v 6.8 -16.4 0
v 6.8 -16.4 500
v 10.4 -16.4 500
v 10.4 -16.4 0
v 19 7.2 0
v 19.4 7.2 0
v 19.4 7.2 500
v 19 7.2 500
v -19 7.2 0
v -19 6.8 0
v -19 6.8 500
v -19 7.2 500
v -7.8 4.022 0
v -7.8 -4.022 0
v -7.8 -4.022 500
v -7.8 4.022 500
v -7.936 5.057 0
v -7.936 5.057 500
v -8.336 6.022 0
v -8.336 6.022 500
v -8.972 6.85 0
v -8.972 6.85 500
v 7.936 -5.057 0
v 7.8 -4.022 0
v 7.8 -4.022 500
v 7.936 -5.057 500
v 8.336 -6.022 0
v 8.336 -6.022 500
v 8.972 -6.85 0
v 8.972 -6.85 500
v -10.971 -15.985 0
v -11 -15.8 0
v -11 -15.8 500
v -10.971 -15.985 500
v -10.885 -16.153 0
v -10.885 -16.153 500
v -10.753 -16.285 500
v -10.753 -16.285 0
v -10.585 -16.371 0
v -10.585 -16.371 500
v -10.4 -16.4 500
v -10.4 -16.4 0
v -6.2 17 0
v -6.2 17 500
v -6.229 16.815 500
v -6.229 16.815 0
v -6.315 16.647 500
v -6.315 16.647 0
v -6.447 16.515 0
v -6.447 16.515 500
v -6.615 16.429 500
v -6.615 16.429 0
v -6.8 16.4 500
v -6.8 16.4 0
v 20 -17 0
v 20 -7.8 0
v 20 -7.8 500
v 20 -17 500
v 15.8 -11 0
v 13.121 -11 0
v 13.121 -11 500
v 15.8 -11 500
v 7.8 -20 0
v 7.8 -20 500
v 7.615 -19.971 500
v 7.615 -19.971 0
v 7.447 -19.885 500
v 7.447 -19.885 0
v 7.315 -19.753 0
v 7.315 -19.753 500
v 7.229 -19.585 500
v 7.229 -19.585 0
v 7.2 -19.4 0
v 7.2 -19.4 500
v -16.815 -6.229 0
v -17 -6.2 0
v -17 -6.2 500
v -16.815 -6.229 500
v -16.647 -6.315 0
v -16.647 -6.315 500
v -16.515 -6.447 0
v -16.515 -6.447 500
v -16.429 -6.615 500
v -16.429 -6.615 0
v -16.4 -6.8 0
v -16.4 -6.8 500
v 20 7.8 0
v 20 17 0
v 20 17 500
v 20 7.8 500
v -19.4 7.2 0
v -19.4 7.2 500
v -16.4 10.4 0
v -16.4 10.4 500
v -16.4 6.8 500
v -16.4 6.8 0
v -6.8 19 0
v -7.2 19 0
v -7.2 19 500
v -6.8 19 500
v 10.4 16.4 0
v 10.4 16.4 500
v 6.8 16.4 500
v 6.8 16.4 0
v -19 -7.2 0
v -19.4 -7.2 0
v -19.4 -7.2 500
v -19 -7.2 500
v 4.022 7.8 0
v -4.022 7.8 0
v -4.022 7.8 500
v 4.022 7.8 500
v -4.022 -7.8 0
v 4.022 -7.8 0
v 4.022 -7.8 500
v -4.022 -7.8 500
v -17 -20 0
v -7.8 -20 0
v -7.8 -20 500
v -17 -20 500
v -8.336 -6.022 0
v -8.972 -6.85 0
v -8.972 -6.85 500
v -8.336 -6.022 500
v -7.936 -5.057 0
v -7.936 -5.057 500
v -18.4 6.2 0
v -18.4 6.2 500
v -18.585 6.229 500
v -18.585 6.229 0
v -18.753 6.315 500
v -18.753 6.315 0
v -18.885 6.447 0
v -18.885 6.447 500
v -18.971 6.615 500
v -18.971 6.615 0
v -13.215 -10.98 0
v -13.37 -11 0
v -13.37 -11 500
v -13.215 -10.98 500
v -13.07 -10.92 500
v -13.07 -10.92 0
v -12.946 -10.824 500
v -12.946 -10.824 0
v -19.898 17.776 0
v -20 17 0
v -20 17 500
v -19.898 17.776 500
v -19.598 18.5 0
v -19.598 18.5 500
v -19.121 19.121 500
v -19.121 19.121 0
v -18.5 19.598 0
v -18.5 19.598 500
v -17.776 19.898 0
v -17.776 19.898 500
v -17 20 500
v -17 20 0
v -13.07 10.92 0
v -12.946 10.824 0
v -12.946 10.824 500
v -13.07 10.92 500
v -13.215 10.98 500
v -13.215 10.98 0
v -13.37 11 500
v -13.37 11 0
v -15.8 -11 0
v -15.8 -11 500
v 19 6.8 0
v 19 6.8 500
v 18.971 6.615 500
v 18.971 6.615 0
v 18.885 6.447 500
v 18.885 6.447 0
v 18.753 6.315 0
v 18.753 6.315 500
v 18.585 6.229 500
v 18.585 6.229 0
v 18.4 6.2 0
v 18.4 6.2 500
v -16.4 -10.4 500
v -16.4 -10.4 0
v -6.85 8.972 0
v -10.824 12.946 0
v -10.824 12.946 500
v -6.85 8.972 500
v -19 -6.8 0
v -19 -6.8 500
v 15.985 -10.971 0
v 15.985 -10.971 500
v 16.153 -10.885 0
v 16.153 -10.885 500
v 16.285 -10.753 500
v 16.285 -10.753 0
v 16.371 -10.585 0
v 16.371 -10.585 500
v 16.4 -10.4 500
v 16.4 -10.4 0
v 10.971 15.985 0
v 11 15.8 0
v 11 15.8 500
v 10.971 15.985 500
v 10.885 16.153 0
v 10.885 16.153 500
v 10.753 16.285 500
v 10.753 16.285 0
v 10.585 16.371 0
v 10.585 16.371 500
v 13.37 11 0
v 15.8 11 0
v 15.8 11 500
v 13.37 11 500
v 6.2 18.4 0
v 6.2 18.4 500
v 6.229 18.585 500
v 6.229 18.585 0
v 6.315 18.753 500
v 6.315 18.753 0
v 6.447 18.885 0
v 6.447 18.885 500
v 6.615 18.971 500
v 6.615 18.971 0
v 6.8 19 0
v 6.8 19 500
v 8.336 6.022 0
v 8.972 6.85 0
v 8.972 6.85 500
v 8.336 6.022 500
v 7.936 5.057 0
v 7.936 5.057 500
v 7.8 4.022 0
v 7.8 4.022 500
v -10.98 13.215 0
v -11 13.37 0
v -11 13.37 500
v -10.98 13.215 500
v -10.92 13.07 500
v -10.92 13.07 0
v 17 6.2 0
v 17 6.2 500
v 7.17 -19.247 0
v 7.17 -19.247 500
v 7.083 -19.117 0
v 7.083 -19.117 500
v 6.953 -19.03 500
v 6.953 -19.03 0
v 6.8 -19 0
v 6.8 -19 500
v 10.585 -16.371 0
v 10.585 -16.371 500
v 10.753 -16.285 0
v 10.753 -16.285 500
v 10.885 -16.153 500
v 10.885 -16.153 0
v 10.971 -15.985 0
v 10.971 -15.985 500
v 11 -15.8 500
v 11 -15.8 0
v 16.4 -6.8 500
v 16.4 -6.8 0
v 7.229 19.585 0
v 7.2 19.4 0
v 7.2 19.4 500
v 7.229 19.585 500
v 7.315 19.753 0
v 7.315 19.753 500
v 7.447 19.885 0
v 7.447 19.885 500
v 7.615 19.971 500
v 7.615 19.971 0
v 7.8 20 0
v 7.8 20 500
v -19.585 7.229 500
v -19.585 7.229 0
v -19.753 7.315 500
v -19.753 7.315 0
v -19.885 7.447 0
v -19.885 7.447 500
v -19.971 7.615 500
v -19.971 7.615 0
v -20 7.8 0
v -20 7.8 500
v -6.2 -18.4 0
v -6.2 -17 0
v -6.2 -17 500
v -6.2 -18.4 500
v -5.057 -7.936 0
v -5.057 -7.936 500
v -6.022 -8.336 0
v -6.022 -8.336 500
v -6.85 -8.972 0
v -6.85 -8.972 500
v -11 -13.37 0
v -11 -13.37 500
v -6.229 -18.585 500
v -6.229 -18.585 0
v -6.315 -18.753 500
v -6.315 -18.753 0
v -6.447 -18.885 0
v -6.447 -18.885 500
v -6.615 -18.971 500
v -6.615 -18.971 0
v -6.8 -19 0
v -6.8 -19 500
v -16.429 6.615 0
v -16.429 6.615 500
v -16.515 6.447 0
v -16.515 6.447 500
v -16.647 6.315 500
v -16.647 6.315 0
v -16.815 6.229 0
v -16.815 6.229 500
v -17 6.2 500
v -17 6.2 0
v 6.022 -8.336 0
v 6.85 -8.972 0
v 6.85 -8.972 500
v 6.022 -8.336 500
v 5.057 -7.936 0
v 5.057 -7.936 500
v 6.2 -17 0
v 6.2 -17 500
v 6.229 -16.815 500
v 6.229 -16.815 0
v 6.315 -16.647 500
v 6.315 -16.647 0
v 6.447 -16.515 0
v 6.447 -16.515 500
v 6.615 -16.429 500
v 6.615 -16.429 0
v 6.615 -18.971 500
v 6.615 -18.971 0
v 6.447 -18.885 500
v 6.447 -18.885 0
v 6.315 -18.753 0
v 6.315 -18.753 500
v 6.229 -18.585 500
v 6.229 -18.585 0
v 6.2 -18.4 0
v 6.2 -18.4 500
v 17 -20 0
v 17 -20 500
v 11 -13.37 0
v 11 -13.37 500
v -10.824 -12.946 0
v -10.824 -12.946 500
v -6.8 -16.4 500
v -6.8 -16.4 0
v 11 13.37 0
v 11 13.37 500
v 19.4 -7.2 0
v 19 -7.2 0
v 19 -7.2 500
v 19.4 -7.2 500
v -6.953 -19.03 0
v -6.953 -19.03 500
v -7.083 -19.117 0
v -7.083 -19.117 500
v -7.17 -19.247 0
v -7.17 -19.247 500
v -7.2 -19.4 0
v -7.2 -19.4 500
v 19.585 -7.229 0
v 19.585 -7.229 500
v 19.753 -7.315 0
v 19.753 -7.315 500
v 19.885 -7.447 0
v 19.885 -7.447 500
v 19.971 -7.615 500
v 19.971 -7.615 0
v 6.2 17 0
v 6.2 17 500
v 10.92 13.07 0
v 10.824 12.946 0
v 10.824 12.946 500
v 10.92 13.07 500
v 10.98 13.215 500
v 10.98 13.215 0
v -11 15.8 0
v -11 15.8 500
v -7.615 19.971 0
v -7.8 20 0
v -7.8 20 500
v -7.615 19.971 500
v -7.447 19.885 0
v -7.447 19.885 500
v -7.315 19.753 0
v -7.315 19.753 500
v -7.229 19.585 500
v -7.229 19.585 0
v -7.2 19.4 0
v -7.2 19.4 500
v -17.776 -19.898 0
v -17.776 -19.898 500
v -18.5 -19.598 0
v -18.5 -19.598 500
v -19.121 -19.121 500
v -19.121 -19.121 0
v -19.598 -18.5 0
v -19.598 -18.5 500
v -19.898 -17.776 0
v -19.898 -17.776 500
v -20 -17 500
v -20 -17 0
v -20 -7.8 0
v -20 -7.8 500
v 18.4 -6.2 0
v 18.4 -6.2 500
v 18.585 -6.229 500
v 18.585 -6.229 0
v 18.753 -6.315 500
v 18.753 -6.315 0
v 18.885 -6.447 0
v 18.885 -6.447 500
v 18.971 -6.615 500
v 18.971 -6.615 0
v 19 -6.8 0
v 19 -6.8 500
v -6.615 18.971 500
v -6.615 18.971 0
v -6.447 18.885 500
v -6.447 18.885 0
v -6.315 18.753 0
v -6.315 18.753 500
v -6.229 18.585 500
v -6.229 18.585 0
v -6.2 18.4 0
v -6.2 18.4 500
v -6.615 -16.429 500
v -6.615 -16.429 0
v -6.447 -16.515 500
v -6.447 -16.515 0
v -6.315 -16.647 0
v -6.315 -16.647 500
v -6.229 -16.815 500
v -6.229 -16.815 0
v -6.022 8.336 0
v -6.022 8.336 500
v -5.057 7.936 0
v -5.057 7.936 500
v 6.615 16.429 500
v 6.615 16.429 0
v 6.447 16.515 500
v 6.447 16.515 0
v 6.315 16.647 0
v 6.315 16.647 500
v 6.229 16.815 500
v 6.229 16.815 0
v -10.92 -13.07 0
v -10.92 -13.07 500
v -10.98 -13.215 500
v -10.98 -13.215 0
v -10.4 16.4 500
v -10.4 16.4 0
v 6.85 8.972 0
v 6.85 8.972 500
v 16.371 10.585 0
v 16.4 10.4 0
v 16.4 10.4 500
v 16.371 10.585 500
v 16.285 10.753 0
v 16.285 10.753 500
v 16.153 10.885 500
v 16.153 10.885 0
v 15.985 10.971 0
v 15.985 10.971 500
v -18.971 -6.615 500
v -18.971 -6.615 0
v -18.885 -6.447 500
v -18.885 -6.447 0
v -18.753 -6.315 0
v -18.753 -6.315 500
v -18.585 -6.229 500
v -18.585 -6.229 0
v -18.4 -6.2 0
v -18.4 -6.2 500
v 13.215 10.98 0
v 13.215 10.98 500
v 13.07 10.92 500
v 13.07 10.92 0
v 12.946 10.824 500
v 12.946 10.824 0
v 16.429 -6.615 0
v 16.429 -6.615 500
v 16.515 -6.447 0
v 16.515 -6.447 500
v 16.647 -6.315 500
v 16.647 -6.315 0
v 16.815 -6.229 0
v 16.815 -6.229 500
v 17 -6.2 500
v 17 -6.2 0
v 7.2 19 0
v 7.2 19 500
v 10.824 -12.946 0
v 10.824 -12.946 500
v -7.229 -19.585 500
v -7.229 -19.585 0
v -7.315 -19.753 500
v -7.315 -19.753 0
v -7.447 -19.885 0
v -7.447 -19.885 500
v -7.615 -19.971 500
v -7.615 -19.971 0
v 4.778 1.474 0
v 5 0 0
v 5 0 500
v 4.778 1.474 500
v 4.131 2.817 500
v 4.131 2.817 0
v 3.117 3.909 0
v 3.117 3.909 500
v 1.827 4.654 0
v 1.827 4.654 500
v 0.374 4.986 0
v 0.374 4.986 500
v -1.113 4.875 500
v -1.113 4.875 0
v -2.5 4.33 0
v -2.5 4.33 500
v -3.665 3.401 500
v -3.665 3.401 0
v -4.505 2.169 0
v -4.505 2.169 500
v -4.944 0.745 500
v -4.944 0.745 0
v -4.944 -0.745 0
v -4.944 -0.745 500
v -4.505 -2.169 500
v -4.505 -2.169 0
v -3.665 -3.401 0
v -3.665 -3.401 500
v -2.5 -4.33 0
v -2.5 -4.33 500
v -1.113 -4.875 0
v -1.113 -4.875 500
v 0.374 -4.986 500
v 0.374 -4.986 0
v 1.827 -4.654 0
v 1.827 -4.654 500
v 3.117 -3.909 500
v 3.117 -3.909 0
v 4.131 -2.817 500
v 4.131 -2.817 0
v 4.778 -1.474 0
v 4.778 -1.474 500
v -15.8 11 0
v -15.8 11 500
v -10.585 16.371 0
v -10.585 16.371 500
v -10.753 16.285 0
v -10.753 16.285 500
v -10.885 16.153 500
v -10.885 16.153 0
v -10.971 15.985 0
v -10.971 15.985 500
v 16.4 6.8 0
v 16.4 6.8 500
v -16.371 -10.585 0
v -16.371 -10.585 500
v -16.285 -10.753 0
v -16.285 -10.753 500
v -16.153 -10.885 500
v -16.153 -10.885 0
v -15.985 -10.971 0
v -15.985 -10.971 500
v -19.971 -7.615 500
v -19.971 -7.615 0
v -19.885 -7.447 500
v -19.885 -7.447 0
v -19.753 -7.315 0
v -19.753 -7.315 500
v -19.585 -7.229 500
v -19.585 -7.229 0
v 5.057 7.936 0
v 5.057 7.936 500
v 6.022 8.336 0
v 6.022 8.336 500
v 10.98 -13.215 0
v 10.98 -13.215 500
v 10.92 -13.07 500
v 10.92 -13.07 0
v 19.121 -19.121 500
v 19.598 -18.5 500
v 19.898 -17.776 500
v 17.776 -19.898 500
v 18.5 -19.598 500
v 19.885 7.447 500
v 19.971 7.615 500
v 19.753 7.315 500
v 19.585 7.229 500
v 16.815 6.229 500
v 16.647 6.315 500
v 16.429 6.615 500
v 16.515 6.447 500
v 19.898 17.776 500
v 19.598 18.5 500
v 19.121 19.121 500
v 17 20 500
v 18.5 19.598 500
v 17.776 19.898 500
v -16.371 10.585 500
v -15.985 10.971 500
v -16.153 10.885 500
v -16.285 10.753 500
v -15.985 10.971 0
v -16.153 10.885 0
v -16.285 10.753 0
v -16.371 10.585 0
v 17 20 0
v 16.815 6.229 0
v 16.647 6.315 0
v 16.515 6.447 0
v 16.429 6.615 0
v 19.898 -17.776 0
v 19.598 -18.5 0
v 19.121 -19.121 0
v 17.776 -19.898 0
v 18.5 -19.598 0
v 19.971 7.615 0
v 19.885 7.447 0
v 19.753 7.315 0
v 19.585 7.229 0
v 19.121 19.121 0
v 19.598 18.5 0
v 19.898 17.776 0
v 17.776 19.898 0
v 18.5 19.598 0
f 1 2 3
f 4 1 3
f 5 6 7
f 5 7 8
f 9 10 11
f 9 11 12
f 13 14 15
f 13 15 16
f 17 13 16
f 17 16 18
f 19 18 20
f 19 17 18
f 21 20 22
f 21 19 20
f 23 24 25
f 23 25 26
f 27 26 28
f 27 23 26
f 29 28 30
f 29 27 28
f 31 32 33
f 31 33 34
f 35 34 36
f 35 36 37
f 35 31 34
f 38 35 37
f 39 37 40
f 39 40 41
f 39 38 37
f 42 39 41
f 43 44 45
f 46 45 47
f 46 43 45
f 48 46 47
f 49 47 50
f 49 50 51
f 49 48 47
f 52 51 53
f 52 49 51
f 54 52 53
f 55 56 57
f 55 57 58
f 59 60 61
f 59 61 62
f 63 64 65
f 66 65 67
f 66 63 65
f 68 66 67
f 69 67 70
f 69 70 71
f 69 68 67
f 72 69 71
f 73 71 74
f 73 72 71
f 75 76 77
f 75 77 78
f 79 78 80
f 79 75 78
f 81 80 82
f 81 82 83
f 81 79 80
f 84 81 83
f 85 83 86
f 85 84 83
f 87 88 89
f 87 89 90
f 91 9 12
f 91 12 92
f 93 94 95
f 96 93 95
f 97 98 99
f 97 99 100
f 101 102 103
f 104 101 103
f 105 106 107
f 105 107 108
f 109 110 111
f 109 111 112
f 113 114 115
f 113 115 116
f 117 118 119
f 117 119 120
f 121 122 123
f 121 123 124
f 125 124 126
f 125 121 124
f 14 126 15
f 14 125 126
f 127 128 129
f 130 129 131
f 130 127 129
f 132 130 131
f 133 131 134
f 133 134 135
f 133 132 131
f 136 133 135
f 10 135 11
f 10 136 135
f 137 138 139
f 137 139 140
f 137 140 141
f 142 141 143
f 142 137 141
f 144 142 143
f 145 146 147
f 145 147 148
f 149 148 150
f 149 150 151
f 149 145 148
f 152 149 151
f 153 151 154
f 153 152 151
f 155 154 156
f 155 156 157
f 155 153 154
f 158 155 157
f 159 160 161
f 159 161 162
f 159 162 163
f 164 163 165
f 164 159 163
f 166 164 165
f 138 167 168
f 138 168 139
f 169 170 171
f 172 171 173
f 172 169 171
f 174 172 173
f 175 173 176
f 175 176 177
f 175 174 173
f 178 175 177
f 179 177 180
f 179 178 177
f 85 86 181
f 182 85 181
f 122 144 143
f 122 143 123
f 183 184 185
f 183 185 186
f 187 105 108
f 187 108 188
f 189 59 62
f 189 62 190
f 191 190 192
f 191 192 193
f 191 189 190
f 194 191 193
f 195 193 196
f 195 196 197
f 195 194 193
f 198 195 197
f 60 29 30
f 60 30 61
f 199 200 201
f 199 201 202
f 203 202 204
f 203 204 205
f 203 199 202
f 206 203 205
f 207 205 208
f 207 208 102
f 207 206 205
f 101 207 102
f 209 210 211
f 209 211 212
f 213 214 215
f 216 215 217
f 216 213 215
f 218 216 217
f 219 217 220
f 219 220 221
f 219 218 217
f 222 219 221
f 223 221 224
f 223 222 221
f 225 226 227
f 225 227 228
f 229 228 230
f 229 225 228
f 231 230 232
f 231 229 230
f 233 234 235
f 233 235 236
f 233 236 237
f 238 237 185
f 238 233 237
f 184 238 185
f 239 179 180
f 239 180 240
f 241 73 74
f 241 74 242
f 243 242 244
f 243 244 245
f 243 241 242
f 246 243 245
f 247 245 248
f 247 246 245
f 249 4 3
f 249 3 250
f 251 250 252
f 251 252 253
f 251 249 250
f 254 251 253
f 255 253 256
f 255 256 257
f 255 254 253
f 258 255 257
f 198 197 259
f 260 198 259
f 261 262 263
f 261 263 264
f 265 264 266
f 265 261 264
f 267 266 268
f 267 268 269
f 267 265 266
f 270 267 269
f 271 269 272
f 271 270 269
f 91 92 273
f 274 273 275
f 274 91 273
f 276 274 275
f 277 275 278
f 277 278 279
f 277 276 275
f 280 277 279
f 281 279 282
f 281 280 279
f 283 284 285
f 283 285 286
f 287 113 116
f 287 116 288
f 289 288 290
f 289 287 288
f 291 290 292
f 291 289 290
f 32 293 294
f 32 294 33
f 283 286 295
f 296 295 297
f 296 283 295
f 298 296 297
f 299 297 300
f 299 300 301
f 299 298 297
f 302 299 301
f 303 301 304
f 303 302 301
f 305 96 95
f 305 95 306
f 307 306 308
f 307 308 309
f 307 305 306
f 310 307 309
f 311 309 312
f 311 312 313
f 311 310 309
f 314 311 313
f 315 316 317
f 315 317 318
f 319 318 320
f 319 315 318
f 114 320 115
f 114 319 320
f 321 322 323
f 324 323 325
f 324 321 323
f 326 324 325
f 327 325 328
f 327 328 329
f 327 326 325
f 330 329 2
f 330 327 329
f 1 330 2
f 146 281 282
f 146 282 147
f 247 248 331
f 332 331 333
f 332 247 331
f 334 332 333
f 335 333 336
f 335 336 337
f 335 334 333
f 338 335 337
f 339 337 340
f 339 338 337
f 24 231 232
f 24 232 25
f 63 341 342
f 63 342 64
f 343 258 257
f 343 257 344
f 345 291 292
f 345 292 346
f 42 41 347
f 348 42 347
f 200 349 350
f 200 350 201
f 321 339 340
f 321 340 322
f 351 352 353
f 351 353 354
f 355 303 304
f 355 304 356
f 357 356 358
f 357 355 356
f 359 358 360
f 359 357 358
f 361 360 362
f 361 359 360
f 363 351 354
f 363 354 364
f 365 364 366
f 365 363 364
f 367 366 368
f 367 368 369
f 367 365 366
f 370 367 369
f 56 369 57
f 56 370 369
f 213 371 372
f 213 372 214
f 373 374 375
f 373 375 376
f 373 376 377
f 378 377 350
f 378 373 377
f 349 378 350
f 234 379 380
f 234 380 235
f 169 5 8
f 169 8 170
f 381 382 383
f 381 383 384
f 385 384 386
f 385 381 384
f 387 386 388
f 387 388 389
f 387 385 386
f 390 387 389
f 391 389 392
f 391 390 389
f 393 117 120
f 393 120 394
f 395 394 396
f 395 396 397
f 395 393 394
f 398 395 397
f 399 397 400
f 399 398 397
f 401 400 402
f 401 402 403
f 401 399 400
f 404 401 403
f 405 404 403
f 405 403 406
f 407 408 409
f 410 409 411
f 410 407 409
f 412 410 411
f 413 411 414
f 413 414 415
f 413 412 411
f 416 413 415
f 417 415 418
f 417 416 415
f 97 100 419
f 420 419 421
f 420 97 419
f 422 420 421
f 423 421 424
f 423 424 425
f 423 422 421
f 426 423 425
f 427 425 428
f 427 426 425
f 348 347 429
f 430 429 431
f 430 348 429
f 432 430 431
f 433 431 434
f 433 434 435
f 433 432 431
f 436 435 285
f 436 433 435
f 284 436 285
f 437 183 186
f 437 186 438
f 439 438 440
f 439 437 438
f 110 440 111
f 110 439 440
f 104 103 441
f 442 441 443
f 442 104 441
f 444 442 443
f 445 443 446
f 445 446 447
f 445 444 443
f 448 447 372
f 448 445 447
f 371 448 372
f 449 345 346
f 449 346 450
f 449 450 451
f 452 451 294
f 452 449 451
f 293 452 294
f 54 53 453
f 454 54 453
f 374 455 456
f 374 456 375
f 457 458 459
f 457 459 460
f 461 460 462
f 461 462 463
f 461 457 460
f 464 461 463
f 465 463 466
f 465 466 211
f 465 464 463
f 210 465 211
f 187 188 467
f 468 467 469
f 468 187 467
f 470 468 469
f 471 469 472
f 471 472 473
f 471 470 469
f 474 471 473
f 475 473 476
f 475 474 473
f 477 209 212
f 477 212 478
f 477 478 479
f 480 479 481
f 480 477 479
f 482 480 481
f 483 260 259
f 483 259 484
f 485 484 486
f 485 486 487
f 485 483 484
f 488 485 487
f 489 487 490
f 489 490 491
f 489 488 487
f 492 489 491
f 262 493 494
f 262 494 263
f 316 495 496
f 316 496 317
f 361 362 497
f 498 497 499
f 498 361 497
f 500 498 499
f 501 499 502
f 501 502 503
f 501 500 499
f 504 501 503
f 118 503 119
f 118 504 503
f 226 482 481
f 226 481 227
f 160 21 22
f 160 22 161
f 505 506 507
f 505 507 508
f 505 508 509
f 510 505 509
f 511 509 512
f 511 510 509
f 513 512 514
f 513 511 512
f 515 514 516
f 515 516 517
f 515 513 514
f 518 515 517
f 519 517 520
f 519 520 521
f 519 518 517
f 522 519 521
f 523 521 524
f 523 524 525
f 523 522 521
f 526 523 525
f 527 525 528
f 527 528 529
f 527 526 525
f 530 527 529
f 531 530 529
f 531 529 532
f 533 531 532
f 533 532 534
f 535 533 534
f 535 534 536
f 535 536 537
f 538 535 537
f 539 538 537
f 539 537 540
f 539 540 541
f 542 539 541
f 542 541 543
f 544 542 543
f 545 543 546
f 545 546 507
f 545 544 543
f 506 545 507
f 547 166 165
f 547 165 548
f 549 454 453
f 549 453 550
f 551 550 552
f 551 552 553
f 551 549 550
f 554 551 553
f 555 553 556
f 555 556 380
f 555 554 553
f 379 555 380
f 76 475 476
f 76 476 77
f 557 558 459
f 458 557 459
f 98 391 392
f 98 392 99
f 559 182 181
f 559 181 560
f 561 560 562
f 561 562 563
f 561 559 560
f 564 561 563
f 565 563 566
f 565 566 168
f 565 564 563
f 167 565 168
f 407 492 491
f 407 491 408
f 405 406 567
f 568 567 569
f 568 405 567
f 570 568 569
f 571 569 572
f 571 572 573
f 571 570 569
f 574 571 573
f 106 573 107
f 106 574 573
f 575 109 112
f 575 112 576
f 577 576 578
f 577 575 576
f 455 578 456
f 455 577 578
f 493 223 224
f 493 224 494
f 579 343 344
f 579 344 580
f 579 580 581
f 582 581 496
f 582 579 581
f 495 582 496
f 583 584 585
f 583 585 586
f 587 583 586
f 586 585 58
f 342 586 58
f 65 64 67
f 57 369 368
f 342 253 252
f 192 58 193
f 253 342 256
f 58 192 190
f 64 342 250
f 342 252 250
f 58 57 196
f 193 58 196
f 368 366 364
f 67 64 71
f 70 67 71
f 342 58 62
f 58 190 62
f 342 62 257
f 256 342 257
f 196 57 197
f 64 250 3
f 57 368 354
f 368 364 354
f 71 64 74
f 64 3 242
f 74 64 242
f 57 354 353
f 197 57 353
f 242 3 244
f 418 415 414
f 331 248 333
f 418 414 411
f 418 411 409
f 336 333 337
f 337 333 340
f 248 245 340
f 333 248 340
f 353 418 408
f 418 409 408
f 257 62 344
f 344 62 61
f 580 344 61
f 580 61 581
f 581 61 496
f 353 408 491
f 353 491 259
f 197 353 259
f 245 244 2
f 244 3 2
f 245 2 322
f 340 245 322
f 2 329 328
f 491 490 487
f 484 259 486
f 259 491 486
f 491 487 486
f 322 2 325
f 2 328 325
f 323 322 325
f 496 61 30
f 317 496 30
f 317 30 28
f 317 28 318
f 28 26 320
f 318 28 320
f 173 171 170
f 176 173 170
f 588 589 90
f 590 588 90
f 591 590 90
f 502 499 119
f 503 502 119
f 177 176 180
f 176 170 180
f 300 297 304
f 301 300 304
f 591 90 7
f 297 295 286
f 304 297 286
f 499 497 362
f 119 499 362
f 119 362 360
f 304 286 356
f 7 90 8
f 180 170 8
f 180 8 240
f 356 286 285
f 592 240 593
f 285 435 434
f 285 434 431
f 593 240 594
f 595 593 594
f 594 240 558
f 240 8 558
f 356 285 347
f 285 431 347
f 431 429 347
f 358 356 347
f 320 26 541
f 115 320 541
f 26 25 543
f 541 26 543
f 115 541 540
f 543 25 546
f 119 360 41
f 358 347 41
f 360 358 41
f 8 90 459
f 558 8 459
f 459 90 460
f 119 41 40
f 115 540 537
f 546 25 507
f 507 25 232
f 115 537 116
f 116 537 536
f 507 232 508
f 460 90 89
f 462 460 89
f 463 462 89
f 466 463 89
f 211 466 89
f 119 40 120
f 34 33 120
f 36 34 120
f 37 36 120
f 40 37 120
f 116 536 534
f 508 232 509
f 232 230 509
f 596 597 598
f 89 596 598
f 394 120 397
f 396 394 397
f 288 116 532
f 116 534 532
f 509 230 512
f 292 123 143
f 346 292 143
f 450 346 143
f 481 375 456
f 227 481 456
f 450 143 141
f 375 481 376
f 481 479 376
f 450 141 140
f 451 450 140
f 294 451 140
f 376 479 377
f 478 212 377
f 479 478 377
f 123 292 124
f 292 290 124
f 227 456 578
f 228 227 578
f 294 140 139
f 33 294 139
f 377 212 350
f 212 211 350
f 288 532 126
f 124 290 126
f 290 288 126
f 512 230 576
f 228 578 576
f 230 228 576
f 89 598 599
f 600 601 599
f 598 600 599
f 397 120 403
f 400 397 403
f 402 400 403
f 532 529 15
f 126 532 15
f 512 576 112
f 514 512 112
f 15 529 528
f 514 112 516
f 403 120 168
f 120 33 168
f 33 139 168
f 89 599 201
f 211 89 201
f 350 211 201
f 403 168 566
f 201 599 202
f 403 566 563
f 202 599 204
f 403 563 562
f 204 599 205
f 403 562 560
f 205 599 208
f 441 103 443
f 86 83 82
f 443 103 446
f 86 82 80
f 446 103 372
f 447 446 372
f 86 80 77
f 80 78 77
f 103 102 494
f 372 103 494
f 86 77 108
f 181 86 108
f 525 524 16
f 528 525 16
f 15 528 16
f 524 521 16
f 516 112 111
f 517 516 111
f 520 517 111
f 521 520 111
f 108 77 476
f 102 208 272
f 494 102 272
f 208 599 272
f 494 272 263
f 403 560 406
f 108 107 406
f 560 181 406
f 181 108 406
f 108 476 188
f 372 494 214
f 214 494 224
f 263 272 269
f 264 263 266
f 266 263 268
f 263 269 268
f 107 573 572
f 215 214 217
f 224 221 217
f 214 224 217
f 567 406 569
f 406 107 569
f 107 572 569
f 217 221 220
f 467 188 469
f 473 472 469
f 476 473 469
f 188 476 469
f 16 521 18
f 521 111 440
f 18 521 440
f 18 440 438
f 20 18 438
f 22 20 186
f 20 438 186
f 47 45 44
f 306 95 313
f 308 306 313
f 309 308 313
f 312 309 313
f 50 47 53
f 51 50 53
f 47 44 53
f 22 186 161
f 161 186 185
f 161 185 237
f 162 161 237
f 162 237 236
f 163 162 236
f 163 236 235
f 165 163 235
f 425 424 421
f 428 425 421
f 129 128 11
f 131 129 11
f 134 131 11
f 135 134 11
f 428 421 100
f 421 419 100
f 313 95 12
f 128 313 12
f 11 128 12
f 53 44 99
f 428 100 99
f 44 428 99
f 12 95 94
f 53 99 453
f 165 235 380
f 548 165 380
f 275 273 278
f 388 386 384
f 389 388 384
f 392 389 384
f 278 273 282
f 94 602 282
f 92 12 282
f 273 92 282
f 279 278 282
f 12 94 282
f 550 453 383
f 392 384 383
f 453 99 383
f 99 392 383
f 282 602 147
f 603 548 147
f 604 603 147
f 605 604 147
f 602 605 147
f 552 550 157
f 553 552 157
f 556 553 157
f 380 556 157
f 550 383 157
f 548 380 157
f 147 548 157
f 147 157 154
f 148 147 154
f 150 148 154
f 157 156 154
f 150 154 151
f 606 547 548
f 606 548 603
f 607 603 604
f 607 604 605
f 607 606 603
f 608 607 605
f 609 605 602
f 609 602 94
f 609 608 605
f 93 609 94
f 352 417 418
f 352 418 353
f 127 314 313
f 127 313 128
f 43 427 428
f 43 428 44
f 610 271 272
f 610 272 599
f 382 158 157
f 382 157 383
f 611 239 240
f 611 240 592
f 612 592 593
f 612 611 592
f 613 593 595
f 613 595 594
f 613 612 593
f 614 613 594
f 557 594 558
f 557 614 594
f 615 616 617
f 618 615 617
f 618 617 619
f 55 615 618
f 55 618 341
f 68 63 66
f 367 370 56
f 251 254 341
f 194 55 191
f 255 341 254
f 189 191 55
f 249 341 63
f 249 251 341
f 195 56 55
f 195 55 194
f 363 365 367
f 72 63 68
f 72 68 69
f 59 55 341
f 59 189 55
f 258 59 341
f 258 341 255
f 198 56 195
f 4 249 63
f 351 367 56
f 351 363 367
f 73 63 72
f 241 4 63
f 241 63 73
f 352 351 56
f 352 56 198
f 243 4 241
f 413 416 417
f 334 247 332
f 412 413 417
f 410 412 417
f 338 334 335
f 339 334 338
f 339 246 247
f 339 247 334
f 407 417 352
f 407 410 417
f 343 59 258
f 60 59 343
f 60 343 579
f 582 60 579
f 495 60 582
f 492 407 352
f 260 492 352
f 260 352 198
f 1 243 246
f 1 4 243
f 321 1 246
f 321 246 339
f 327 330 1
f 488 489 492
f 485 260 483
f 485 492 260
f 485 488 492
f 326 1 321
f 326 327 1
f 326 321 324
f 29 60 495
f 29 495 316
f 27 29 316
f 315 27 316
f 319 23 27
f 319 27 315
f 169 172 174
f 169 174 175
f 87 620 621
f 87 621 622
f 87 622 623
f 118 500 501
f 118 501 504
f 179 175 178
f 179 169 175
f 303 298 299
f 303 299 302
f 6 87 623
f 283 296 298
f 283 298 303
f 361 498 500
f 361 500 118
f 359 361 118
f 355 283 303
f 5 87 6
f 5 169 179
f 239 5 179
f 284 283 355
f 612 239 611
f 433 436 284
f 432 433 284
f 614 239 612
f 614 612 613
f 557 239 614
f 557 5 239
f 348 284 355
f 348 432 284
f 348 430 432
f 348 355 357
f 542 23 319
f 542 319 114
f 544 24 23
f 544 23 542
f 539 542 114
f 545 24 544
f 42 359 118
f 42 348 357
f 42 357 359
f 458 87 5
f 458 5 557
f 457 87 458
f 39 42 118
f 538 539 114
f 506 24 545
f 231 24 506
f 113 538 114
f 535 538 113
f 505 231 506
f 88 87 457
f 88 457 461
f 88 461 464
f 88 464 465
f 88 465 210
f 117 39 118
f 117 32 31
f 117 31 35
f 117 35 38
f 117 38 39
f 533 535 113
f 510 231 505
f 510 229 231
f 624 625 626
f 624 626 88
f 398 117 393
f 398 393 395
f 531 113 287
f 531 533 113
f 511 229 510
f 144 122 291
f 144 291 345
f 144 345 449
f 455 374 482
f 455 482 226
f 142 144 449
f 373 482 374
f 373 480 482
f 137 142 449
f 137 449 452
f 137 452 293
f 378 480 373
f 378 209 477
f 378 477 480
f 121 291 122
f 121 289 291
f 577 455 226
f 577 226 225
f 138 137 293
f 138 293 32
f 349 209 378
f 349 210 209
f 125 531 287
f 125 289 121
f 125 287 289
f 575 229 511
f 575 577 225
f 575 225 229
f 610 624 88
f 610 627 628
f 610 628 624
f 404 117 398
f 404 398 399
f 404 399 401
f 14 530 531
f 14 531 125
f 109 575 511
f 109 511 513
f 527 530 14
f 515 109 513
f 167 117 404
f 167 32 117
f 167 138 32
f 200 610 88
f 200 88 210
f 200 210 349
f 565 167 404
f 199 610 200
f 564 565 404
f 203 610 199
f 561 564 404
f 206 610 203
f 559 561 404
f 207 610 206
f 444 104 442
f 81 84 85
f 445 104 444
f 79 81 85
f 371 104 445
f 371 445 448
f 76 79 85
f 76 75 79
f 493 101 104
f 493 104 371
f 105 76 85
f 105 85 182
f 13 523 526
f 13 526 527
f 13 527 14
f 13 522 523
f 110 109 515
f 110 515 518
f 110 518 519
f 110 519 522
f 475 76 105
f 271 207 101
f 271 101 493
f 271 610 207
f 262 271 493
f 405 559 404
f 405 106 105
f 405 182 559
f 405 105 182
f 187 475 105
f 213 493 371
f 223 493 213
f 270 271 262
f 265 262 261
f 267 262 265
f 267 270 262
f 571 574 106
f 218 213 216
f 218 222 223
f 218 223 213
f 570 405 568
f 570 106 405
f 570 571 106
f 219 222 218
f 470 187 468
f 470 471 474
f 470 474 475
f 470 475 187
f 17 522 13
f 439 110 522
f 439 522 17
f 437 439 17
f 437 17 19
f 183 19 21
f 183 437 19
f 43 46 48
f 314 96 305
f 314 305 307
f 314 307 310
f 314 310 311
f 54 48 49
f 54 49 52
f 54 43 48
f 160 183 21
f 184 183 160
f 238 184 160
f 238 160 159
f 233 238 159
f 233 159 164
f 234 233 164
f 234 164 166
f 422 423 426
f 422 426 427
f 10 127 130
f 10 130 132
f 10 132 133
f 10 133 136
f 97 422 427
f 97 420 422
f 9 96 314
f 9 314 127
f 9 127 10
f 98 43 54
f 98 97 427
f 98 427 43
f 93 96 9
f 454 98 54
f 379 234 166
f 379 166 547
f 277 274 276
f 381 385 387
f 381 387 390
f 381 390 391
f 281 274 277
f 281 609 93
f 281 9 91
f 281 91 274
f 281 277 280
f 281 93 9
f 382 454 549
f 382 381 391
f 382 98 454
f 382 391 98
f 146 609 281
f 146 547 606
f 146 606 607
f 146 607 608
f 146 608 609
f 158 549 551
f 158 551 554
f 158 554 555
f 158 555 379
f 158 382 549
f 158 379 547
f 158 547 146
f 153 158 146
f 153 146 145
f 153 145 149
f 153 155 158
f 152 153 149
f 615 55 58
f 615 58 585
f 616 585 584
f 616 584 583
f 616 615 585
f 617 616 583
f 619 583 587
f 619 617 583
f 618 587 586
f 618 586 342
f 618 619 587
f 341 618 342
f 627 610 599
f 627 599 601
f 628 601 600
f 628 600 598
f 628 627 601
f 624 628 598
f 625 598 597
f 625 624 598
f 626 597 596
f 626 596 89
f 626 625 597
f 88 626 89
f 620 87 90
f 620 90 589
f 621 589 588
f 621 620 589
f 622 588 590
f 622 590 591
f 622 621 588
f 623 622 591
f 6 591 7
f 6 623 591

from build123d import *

# Parameters (mm, degrees)
MODEL_R             = 5
BOSS_EXTRUDE1_DEPTH = 500


with BuildPart() as part:
    # Model → Boss-Extrude1 (new body)
    with BuildSketch(Plane.XY):
        with BuildLine():
            Line((7.8, 0), (7.8, -4.021825407))
            ThreePointArc((7.8, -4.021825407), (8.10448187, -5.552559136), (8.971572875, -6.850252532))
            Line((8.971572875, -6.850252532), (13.121320343, -11))
            Line((13.121320343, -11), (15.8, -11))
            ThreePointArc((15.8, -11), (16.224264069, -10.824264069), (16.4, -10.4))
            Line((16.4, -10.4), (16.4, -6.8))
            ThreePointArc((16.4, -6.8), (16.575735931, -6.375735931), (17, -6.2))
            Line((17, -6.2), (18.4, -6.2))
            ThreePointArc((18.4, -6.2), (18.824264069, -6.375735931), (19, -6.8))
            Line((19, -6.8), (19, -7.2))
            Line((19, -7.2), (19.4, -7.2))
            ThreePointArc((19.4, -7.2), (19.824264068, -7.375735931), (20, -7.8))
            Line((20, -7.8), (20, -17))
            ThreePointArc((20, -17), (19.121320343, -19.121320343), (17, -20))
            Line((17, -20), (7.8, -20))
            ThreePointArc((7.8, -20), (7.375735931, -19.824264069), (7.2, -19.4))
            ThreePointArc((7.2, -19.4), (7.082842712, -19.117157287), (6.8, -19))
            ThreePointArc((6.8, -19), (6.375735931, -18.824264069), (6.2, -18.4))
            Line((6.2, -18.4), (6.2, -16.999999999))
            ThreePointArc((6.2, -16.999999999), (6.375735931, -16.575735931), (6.8, -16.4))
            Line((6.8, -16.4), (10.4, -16.4))
            ThreePointArc((10.4, -16.4), (10.824264069, -16.224264069), (11, -15.8))
            Line((11, -15.8), (11, -13.369848481))
            ThreePointArc((11, -13.369848481), (10.954327719, -13.140238421), (10.824264069, -12.945584412))
            Line((10.824264069, -12.945584412), (6.850252532, -8.971572875))
            ThreePointArc((6.850252532, -8.971572875), (5.552559136, -8.10448187), (4.021825407, -7.8))
            Line((4.021825407, -7.8), (0, -7.8))
            Line((0, -7.8), (-4.021825407, -7.8))
            ThreePointArc((-4.021825407, -7.8), (-5.552559136, -8.10448187), (-6.850252532, -8.971572875))
            Line((-6.850252532, -8.971572875), (-10.824264069, -12.945584412))
            ThreePointArc((-10.824264069, -12.945584412), (-10.954327719, -13.140238421), (-11, -13.369848481))
            Line((-11, -13.369848481), (-11, -15.8))
            ThreePointArc((-11, -15.8), (-10.824264069, -16.224264069), (-10.4, -16.4))
            Line((-10.4, -16.4), (-6.8, -16.4))
            ThreePointArc((-6.8, -16.4), (-6.375735931, -16.575735931), (-6.2, -16.999999999))
            Line((-6.2, -16.999999999), (-6.2, -18.4))
            ThreePointArc((-6.2, -18.4), (-6.375735931, -18.824264069), (-6.8, -19))
            ThreePointArc((-6.8, -19), (-7.082842712, -19.117157287), (-7.2, -19.4))
            ThreePointArc((-7.2, -19.4), (-7.375735931, -19.824264069), (-7.8, -20))
            Line((-7.8, -20), (-17, -20))
            ThreePointArc((-17, -20), (-19.121320343, -19.121320343), (-20, -17))
            Line((-20, -17), (-20, -7.8))
            ThreePointArc((-20, -7.8), (-19.824264069, -7.375735931), (-19.4, -7.2))
            Line((-19.4, -7.2), (-19, -7.2))
            Line((-19, -7.2), (-19, -6.8))
            ThreePointArc((-19, -6.8), (-18.824264069, -6.375735931), (-18.4, -6.2))
            Line((-18.4, -6.2), (-17, -6.2))
            ThreePointArc((-17, -6.2), (-16.575735931, -6.375735931), (-16.4, -6.8))
            Line((-16.4, -6.8), (-16.4, -10.4))
            ThreePointArc((-16.4, -10.4), (-16.224264069, -10.824264069), (-15.8, -11))
            Line((-15.8, -11), (-13.369848481, -11))
            ThreePointArc((-13.369848481, -11), (-13.140238421, -10.954327719), (-12.945584412, -10.824264069))
            Line((-12.945584412, -10.824264069), (-8.971572875, -6.850252532))
            ThreePointArc((-8.971572875, -6.850252532), (-8.10448187, -5.552559136), (-7.8, -4.021825407))
            Line((-7.8, -4.021825407), (-7.8, 0))
            Line((-7.8, 0), (-7.8, 4.021825407))
            ThreePointArc((-7.8, 4.021825407), (-8.10448187, 5.552559136), (-8.971572875, 6.850252532))
            Line((-8.971572875, 6.850252532), (-12.945584412, 10.824264069))
            ThreePointArc((-12.945584412, 10.824264069), (-13.140238421, 10.954327719), (-13.369848481, 11))
            Line((-13.369848481, 11), (-15.8, 11))
            ThreePointArc((-15.8, 11), (-16.224264069, 10.824264069), (-16.4, 10.4))
            Line((-16.4, 10.4), (-16.4, 6.8))
            ThreePointArc((-16.4, 6.8), (-16.575735931, 6.375735931), (-17, 6.2))
            Line((-17, 6.2), (-18.4, 6.2))
            ThreePointArc((-18.4, 6.2), (-18.824264069, 6.375735931), (-19, 6.8))
            Line((-19, 6.8), (-19, 7.2))
            Line((-19, 7.2), (-19.4, 7.2))
            ThreePointArc((-19.4, 7.2), (-19.824264069, 7.375735931), (-20, 7.8))
            Line((-20, 7.8), (-20, 17))
            ThreePointArc((-20, 17), (-19.121320343, 19.121320343), (-17, 20))
            Line((-17, 20), (-7.8, 20))
            ThreePointArc((-7.8, 20), (-7.375735931, 19.824264068), (-7.2, 19.4))
            Line((-7.2, 19.4), (-7.2, 19))
            Line((-7.2, 19), (-6.8, 19))
            ThreePointArc((-6.8, 19), (-6.375735931, 18.824264069), (-6.2, 18.4))
            Line((-6.2, 18.4), (-6.2, 16.999999999))
            ThreePointArc((-6.2, 16.999999999), (-6.375735931, 16.575735931), (-6.8, 16.4))
            Line((-6.8, 16.4), (-10.4, 16.4))
            ThreePointArc((-10.4, 16.4), (-10.824264069, 16.224264069), (-11, 15.8))
            Line((-11, 15.8), (-11, 13.369848481))
            ThreePointArc((-11, 13.369848481), (-10.954327719, 13.140238421), (-10.824264069, 12.945584412))
            Line((-10.824264069, 12.945584412), (-6.850252532, 8.971572875))
            ThreePointArc((-6.850252532, 8.971572875), (-5.552559136, 8.10448187), (-4.021825407, 7.8))
            Line((-4.021825407, 7.8), (0, 7.8))
            Line((0, 7.8), (4.021825407, 7.8))
            ThreePointArc((4.021825407, 7.8), (5.552559136, 8.10448187), (6.850252532, 8.971572875))
            Line((6.850252532, 8.971572875), (10.824264069, 12.945584412))
            ThreePointArc((10.824264069, 12.945584412), (10.954327719, 13.140238421), (11, 13.369848481))
            Line((11, 13.369848481), (11, 15.8))
            ThreePointArc((11, 15.8), (10.824264069, 16.224264069), (10.4, 16.4))
            Line((10.4, 16.4), (6.8, 16.4))
            ThreePointArc((6.8, 16.4), (6.375735931, 16.575735931), (6.2, 16.999999999))
            Line((6.2, 16.999999999), (6.2, 18.4))
            ThreePointArc((6.2, 18.4), (6.375735931, 18.824264069), (6.8, 19))
            Line((6.8, 19), (7.2, 19))
            Line((7.2, 19), (7.2, 19.4))
            ThreePointArc((7.2, 19.4), (7.375735931, 19.824264068), (7.8, 20))
            Line((7.8, 20), (17, 20))
            ThreePointArc((17, 20), (19.121320343, 19.121320343), (20, 17))
            Line((20, 17), (20, 7.8))
            ThreePointArc((20, 7.8), (19.824264068, 7.375735931), (19.4, 7.2))
            Line((19.4, 7.2), (19, 7.2))
            Line((19, 7.2), (19, 6.8))
            ThreePointArc((19, 6.8), (18.824264069, 6.375735931), (18.4, 6.2))
            Line((18.4, 6.2), (17, 6.2))
            ThreePointArc((17, 6.2), (16.575735931, 6.375735931), (16.4, 6.8))
            Line((16.4, 6.8), (16.4, 10.4))
            ThreePointArc((16.4, 10.4), (16.224264069, 10.824264069), (15.8, 11))
            Line((15.8, 11), (13.369848481, 11))
            ThreePointArc((13.369848481, 11), (13.140238421, 10.954327719), (12.945584412, 10.824264069))
            Line((12.945584412, 10.824264069), (8.971572875, 6.850252532))
            ThreePointArc((8.971572875, 6.850252532), (8.10448187, 5.552559136), (7.8, 4.021825407))
            Line((7.8, 4.021825407), (7.8, 0))
        make_face()
        Circle(MODEL_R, mode=Mode.SUBTRACT)
    extrude(amount=BOSS_EXTRUDE1_DEPTH)


solid = part.part
